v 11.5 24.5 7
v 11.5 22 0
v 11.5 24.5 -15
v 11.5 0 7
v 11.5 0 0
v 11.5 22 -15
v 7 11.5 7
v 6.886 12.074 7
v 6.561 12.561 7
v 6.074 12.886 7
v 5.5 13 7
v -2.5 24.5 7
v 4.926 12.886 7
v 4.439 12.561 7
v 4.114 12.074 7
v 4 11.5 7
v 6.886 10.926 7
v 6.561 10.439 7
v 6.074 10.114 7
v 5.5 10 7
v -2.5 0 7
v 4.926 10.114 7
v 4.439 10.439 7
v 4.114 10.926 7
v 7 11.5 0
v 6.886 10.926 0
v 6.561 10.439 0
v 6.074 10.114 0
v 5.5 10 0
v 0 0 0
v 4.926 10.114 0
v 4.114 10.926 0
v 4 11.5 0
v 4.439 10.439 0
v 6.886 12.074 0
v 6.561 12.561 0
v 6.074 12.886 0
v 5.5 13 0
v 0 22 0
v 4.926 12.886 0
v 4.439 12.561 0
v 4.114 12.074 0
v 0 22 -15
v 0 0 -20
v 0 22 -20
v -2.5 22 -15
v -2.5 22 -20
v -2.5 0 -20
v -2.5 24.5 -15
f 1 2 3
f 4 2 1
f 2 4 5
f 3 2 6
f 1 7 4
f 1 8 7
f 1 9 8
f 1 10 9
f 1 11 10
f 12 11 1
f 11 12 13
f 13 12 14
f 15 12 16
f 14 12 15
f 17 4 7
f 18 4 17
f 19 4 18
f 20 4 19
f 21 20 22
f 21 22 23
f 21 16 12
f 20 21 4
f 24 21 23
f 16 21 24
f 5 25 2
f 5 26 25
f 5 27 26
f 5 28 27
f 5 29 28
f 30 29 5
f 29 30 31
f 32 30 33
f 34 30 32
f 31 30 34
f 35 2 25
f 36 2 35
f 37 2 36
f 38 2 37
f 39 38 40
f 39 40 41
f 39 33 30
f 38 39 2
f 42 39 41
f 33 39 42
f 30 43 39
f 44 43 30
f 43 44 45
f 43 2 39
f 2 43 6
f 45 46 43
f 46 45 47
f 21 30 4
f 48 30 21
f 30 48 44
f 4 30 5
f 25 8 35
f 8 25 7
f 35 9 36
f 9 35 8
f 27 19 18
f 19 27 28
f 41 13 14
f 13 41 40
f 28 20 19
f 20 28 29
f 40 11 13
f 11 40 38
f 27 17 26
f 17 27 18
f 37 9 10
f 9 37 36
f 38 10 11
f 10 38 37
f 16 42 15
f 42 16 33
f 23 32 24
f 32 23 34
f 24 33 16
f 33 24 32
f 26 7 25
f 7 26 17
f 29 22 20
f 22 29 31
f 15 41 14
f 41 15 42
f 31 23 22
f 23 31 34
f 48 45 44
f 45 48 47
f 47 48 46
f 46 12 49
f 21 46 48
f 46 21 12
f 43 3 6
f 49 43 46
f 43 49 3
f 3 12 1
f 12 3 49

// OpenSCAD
offset = 0.1;
$fn=16;

hole_diameter = 3;
hole_radius= hole_diameter / 2;
thickness = 8;

top_platform_width = 11.5;
top_platform_length = 22;

height_off_platform = 7;
distance_between_holes = 84;

hole_offset_x = 4;
hole_offset_y = 10;

// Top Platform where screw is inserted
difference(){
  cube([top_platform_width, top_platform_length , height_off_platform]);

  translate([hole_offset_x + hole_radius,
             hole_offset_y + hole_radius,
             -offset
            ])
  cylinder(r=hole_radius, h=height_off_platform + 2*offset);
}


support_wall_thickness = 2.5;

// side support
side_support_dip = 20;  //TODO - need to taper in the front
side_support_height = side_support_dip + height_off_platform;

color([0,1,0])

translate([-support_wall_thickness,
           0,
           -side_support_dip])

cube([support_wall_thickness,
      top_platform_length,
      side_support_height]);


//back support
back_support_dip = 15;
back_support_height = back_support_dip + height_off_platform;
back_support_width = top_platform_width + support_wall_thickness;

color([0,0,1])

translate([-support_wall_thickness,
           top_platform_length,
           -back_support_dip])

cube([
      back_support_width,
      support_wall_thickness,
      back_support_height
     ]);
